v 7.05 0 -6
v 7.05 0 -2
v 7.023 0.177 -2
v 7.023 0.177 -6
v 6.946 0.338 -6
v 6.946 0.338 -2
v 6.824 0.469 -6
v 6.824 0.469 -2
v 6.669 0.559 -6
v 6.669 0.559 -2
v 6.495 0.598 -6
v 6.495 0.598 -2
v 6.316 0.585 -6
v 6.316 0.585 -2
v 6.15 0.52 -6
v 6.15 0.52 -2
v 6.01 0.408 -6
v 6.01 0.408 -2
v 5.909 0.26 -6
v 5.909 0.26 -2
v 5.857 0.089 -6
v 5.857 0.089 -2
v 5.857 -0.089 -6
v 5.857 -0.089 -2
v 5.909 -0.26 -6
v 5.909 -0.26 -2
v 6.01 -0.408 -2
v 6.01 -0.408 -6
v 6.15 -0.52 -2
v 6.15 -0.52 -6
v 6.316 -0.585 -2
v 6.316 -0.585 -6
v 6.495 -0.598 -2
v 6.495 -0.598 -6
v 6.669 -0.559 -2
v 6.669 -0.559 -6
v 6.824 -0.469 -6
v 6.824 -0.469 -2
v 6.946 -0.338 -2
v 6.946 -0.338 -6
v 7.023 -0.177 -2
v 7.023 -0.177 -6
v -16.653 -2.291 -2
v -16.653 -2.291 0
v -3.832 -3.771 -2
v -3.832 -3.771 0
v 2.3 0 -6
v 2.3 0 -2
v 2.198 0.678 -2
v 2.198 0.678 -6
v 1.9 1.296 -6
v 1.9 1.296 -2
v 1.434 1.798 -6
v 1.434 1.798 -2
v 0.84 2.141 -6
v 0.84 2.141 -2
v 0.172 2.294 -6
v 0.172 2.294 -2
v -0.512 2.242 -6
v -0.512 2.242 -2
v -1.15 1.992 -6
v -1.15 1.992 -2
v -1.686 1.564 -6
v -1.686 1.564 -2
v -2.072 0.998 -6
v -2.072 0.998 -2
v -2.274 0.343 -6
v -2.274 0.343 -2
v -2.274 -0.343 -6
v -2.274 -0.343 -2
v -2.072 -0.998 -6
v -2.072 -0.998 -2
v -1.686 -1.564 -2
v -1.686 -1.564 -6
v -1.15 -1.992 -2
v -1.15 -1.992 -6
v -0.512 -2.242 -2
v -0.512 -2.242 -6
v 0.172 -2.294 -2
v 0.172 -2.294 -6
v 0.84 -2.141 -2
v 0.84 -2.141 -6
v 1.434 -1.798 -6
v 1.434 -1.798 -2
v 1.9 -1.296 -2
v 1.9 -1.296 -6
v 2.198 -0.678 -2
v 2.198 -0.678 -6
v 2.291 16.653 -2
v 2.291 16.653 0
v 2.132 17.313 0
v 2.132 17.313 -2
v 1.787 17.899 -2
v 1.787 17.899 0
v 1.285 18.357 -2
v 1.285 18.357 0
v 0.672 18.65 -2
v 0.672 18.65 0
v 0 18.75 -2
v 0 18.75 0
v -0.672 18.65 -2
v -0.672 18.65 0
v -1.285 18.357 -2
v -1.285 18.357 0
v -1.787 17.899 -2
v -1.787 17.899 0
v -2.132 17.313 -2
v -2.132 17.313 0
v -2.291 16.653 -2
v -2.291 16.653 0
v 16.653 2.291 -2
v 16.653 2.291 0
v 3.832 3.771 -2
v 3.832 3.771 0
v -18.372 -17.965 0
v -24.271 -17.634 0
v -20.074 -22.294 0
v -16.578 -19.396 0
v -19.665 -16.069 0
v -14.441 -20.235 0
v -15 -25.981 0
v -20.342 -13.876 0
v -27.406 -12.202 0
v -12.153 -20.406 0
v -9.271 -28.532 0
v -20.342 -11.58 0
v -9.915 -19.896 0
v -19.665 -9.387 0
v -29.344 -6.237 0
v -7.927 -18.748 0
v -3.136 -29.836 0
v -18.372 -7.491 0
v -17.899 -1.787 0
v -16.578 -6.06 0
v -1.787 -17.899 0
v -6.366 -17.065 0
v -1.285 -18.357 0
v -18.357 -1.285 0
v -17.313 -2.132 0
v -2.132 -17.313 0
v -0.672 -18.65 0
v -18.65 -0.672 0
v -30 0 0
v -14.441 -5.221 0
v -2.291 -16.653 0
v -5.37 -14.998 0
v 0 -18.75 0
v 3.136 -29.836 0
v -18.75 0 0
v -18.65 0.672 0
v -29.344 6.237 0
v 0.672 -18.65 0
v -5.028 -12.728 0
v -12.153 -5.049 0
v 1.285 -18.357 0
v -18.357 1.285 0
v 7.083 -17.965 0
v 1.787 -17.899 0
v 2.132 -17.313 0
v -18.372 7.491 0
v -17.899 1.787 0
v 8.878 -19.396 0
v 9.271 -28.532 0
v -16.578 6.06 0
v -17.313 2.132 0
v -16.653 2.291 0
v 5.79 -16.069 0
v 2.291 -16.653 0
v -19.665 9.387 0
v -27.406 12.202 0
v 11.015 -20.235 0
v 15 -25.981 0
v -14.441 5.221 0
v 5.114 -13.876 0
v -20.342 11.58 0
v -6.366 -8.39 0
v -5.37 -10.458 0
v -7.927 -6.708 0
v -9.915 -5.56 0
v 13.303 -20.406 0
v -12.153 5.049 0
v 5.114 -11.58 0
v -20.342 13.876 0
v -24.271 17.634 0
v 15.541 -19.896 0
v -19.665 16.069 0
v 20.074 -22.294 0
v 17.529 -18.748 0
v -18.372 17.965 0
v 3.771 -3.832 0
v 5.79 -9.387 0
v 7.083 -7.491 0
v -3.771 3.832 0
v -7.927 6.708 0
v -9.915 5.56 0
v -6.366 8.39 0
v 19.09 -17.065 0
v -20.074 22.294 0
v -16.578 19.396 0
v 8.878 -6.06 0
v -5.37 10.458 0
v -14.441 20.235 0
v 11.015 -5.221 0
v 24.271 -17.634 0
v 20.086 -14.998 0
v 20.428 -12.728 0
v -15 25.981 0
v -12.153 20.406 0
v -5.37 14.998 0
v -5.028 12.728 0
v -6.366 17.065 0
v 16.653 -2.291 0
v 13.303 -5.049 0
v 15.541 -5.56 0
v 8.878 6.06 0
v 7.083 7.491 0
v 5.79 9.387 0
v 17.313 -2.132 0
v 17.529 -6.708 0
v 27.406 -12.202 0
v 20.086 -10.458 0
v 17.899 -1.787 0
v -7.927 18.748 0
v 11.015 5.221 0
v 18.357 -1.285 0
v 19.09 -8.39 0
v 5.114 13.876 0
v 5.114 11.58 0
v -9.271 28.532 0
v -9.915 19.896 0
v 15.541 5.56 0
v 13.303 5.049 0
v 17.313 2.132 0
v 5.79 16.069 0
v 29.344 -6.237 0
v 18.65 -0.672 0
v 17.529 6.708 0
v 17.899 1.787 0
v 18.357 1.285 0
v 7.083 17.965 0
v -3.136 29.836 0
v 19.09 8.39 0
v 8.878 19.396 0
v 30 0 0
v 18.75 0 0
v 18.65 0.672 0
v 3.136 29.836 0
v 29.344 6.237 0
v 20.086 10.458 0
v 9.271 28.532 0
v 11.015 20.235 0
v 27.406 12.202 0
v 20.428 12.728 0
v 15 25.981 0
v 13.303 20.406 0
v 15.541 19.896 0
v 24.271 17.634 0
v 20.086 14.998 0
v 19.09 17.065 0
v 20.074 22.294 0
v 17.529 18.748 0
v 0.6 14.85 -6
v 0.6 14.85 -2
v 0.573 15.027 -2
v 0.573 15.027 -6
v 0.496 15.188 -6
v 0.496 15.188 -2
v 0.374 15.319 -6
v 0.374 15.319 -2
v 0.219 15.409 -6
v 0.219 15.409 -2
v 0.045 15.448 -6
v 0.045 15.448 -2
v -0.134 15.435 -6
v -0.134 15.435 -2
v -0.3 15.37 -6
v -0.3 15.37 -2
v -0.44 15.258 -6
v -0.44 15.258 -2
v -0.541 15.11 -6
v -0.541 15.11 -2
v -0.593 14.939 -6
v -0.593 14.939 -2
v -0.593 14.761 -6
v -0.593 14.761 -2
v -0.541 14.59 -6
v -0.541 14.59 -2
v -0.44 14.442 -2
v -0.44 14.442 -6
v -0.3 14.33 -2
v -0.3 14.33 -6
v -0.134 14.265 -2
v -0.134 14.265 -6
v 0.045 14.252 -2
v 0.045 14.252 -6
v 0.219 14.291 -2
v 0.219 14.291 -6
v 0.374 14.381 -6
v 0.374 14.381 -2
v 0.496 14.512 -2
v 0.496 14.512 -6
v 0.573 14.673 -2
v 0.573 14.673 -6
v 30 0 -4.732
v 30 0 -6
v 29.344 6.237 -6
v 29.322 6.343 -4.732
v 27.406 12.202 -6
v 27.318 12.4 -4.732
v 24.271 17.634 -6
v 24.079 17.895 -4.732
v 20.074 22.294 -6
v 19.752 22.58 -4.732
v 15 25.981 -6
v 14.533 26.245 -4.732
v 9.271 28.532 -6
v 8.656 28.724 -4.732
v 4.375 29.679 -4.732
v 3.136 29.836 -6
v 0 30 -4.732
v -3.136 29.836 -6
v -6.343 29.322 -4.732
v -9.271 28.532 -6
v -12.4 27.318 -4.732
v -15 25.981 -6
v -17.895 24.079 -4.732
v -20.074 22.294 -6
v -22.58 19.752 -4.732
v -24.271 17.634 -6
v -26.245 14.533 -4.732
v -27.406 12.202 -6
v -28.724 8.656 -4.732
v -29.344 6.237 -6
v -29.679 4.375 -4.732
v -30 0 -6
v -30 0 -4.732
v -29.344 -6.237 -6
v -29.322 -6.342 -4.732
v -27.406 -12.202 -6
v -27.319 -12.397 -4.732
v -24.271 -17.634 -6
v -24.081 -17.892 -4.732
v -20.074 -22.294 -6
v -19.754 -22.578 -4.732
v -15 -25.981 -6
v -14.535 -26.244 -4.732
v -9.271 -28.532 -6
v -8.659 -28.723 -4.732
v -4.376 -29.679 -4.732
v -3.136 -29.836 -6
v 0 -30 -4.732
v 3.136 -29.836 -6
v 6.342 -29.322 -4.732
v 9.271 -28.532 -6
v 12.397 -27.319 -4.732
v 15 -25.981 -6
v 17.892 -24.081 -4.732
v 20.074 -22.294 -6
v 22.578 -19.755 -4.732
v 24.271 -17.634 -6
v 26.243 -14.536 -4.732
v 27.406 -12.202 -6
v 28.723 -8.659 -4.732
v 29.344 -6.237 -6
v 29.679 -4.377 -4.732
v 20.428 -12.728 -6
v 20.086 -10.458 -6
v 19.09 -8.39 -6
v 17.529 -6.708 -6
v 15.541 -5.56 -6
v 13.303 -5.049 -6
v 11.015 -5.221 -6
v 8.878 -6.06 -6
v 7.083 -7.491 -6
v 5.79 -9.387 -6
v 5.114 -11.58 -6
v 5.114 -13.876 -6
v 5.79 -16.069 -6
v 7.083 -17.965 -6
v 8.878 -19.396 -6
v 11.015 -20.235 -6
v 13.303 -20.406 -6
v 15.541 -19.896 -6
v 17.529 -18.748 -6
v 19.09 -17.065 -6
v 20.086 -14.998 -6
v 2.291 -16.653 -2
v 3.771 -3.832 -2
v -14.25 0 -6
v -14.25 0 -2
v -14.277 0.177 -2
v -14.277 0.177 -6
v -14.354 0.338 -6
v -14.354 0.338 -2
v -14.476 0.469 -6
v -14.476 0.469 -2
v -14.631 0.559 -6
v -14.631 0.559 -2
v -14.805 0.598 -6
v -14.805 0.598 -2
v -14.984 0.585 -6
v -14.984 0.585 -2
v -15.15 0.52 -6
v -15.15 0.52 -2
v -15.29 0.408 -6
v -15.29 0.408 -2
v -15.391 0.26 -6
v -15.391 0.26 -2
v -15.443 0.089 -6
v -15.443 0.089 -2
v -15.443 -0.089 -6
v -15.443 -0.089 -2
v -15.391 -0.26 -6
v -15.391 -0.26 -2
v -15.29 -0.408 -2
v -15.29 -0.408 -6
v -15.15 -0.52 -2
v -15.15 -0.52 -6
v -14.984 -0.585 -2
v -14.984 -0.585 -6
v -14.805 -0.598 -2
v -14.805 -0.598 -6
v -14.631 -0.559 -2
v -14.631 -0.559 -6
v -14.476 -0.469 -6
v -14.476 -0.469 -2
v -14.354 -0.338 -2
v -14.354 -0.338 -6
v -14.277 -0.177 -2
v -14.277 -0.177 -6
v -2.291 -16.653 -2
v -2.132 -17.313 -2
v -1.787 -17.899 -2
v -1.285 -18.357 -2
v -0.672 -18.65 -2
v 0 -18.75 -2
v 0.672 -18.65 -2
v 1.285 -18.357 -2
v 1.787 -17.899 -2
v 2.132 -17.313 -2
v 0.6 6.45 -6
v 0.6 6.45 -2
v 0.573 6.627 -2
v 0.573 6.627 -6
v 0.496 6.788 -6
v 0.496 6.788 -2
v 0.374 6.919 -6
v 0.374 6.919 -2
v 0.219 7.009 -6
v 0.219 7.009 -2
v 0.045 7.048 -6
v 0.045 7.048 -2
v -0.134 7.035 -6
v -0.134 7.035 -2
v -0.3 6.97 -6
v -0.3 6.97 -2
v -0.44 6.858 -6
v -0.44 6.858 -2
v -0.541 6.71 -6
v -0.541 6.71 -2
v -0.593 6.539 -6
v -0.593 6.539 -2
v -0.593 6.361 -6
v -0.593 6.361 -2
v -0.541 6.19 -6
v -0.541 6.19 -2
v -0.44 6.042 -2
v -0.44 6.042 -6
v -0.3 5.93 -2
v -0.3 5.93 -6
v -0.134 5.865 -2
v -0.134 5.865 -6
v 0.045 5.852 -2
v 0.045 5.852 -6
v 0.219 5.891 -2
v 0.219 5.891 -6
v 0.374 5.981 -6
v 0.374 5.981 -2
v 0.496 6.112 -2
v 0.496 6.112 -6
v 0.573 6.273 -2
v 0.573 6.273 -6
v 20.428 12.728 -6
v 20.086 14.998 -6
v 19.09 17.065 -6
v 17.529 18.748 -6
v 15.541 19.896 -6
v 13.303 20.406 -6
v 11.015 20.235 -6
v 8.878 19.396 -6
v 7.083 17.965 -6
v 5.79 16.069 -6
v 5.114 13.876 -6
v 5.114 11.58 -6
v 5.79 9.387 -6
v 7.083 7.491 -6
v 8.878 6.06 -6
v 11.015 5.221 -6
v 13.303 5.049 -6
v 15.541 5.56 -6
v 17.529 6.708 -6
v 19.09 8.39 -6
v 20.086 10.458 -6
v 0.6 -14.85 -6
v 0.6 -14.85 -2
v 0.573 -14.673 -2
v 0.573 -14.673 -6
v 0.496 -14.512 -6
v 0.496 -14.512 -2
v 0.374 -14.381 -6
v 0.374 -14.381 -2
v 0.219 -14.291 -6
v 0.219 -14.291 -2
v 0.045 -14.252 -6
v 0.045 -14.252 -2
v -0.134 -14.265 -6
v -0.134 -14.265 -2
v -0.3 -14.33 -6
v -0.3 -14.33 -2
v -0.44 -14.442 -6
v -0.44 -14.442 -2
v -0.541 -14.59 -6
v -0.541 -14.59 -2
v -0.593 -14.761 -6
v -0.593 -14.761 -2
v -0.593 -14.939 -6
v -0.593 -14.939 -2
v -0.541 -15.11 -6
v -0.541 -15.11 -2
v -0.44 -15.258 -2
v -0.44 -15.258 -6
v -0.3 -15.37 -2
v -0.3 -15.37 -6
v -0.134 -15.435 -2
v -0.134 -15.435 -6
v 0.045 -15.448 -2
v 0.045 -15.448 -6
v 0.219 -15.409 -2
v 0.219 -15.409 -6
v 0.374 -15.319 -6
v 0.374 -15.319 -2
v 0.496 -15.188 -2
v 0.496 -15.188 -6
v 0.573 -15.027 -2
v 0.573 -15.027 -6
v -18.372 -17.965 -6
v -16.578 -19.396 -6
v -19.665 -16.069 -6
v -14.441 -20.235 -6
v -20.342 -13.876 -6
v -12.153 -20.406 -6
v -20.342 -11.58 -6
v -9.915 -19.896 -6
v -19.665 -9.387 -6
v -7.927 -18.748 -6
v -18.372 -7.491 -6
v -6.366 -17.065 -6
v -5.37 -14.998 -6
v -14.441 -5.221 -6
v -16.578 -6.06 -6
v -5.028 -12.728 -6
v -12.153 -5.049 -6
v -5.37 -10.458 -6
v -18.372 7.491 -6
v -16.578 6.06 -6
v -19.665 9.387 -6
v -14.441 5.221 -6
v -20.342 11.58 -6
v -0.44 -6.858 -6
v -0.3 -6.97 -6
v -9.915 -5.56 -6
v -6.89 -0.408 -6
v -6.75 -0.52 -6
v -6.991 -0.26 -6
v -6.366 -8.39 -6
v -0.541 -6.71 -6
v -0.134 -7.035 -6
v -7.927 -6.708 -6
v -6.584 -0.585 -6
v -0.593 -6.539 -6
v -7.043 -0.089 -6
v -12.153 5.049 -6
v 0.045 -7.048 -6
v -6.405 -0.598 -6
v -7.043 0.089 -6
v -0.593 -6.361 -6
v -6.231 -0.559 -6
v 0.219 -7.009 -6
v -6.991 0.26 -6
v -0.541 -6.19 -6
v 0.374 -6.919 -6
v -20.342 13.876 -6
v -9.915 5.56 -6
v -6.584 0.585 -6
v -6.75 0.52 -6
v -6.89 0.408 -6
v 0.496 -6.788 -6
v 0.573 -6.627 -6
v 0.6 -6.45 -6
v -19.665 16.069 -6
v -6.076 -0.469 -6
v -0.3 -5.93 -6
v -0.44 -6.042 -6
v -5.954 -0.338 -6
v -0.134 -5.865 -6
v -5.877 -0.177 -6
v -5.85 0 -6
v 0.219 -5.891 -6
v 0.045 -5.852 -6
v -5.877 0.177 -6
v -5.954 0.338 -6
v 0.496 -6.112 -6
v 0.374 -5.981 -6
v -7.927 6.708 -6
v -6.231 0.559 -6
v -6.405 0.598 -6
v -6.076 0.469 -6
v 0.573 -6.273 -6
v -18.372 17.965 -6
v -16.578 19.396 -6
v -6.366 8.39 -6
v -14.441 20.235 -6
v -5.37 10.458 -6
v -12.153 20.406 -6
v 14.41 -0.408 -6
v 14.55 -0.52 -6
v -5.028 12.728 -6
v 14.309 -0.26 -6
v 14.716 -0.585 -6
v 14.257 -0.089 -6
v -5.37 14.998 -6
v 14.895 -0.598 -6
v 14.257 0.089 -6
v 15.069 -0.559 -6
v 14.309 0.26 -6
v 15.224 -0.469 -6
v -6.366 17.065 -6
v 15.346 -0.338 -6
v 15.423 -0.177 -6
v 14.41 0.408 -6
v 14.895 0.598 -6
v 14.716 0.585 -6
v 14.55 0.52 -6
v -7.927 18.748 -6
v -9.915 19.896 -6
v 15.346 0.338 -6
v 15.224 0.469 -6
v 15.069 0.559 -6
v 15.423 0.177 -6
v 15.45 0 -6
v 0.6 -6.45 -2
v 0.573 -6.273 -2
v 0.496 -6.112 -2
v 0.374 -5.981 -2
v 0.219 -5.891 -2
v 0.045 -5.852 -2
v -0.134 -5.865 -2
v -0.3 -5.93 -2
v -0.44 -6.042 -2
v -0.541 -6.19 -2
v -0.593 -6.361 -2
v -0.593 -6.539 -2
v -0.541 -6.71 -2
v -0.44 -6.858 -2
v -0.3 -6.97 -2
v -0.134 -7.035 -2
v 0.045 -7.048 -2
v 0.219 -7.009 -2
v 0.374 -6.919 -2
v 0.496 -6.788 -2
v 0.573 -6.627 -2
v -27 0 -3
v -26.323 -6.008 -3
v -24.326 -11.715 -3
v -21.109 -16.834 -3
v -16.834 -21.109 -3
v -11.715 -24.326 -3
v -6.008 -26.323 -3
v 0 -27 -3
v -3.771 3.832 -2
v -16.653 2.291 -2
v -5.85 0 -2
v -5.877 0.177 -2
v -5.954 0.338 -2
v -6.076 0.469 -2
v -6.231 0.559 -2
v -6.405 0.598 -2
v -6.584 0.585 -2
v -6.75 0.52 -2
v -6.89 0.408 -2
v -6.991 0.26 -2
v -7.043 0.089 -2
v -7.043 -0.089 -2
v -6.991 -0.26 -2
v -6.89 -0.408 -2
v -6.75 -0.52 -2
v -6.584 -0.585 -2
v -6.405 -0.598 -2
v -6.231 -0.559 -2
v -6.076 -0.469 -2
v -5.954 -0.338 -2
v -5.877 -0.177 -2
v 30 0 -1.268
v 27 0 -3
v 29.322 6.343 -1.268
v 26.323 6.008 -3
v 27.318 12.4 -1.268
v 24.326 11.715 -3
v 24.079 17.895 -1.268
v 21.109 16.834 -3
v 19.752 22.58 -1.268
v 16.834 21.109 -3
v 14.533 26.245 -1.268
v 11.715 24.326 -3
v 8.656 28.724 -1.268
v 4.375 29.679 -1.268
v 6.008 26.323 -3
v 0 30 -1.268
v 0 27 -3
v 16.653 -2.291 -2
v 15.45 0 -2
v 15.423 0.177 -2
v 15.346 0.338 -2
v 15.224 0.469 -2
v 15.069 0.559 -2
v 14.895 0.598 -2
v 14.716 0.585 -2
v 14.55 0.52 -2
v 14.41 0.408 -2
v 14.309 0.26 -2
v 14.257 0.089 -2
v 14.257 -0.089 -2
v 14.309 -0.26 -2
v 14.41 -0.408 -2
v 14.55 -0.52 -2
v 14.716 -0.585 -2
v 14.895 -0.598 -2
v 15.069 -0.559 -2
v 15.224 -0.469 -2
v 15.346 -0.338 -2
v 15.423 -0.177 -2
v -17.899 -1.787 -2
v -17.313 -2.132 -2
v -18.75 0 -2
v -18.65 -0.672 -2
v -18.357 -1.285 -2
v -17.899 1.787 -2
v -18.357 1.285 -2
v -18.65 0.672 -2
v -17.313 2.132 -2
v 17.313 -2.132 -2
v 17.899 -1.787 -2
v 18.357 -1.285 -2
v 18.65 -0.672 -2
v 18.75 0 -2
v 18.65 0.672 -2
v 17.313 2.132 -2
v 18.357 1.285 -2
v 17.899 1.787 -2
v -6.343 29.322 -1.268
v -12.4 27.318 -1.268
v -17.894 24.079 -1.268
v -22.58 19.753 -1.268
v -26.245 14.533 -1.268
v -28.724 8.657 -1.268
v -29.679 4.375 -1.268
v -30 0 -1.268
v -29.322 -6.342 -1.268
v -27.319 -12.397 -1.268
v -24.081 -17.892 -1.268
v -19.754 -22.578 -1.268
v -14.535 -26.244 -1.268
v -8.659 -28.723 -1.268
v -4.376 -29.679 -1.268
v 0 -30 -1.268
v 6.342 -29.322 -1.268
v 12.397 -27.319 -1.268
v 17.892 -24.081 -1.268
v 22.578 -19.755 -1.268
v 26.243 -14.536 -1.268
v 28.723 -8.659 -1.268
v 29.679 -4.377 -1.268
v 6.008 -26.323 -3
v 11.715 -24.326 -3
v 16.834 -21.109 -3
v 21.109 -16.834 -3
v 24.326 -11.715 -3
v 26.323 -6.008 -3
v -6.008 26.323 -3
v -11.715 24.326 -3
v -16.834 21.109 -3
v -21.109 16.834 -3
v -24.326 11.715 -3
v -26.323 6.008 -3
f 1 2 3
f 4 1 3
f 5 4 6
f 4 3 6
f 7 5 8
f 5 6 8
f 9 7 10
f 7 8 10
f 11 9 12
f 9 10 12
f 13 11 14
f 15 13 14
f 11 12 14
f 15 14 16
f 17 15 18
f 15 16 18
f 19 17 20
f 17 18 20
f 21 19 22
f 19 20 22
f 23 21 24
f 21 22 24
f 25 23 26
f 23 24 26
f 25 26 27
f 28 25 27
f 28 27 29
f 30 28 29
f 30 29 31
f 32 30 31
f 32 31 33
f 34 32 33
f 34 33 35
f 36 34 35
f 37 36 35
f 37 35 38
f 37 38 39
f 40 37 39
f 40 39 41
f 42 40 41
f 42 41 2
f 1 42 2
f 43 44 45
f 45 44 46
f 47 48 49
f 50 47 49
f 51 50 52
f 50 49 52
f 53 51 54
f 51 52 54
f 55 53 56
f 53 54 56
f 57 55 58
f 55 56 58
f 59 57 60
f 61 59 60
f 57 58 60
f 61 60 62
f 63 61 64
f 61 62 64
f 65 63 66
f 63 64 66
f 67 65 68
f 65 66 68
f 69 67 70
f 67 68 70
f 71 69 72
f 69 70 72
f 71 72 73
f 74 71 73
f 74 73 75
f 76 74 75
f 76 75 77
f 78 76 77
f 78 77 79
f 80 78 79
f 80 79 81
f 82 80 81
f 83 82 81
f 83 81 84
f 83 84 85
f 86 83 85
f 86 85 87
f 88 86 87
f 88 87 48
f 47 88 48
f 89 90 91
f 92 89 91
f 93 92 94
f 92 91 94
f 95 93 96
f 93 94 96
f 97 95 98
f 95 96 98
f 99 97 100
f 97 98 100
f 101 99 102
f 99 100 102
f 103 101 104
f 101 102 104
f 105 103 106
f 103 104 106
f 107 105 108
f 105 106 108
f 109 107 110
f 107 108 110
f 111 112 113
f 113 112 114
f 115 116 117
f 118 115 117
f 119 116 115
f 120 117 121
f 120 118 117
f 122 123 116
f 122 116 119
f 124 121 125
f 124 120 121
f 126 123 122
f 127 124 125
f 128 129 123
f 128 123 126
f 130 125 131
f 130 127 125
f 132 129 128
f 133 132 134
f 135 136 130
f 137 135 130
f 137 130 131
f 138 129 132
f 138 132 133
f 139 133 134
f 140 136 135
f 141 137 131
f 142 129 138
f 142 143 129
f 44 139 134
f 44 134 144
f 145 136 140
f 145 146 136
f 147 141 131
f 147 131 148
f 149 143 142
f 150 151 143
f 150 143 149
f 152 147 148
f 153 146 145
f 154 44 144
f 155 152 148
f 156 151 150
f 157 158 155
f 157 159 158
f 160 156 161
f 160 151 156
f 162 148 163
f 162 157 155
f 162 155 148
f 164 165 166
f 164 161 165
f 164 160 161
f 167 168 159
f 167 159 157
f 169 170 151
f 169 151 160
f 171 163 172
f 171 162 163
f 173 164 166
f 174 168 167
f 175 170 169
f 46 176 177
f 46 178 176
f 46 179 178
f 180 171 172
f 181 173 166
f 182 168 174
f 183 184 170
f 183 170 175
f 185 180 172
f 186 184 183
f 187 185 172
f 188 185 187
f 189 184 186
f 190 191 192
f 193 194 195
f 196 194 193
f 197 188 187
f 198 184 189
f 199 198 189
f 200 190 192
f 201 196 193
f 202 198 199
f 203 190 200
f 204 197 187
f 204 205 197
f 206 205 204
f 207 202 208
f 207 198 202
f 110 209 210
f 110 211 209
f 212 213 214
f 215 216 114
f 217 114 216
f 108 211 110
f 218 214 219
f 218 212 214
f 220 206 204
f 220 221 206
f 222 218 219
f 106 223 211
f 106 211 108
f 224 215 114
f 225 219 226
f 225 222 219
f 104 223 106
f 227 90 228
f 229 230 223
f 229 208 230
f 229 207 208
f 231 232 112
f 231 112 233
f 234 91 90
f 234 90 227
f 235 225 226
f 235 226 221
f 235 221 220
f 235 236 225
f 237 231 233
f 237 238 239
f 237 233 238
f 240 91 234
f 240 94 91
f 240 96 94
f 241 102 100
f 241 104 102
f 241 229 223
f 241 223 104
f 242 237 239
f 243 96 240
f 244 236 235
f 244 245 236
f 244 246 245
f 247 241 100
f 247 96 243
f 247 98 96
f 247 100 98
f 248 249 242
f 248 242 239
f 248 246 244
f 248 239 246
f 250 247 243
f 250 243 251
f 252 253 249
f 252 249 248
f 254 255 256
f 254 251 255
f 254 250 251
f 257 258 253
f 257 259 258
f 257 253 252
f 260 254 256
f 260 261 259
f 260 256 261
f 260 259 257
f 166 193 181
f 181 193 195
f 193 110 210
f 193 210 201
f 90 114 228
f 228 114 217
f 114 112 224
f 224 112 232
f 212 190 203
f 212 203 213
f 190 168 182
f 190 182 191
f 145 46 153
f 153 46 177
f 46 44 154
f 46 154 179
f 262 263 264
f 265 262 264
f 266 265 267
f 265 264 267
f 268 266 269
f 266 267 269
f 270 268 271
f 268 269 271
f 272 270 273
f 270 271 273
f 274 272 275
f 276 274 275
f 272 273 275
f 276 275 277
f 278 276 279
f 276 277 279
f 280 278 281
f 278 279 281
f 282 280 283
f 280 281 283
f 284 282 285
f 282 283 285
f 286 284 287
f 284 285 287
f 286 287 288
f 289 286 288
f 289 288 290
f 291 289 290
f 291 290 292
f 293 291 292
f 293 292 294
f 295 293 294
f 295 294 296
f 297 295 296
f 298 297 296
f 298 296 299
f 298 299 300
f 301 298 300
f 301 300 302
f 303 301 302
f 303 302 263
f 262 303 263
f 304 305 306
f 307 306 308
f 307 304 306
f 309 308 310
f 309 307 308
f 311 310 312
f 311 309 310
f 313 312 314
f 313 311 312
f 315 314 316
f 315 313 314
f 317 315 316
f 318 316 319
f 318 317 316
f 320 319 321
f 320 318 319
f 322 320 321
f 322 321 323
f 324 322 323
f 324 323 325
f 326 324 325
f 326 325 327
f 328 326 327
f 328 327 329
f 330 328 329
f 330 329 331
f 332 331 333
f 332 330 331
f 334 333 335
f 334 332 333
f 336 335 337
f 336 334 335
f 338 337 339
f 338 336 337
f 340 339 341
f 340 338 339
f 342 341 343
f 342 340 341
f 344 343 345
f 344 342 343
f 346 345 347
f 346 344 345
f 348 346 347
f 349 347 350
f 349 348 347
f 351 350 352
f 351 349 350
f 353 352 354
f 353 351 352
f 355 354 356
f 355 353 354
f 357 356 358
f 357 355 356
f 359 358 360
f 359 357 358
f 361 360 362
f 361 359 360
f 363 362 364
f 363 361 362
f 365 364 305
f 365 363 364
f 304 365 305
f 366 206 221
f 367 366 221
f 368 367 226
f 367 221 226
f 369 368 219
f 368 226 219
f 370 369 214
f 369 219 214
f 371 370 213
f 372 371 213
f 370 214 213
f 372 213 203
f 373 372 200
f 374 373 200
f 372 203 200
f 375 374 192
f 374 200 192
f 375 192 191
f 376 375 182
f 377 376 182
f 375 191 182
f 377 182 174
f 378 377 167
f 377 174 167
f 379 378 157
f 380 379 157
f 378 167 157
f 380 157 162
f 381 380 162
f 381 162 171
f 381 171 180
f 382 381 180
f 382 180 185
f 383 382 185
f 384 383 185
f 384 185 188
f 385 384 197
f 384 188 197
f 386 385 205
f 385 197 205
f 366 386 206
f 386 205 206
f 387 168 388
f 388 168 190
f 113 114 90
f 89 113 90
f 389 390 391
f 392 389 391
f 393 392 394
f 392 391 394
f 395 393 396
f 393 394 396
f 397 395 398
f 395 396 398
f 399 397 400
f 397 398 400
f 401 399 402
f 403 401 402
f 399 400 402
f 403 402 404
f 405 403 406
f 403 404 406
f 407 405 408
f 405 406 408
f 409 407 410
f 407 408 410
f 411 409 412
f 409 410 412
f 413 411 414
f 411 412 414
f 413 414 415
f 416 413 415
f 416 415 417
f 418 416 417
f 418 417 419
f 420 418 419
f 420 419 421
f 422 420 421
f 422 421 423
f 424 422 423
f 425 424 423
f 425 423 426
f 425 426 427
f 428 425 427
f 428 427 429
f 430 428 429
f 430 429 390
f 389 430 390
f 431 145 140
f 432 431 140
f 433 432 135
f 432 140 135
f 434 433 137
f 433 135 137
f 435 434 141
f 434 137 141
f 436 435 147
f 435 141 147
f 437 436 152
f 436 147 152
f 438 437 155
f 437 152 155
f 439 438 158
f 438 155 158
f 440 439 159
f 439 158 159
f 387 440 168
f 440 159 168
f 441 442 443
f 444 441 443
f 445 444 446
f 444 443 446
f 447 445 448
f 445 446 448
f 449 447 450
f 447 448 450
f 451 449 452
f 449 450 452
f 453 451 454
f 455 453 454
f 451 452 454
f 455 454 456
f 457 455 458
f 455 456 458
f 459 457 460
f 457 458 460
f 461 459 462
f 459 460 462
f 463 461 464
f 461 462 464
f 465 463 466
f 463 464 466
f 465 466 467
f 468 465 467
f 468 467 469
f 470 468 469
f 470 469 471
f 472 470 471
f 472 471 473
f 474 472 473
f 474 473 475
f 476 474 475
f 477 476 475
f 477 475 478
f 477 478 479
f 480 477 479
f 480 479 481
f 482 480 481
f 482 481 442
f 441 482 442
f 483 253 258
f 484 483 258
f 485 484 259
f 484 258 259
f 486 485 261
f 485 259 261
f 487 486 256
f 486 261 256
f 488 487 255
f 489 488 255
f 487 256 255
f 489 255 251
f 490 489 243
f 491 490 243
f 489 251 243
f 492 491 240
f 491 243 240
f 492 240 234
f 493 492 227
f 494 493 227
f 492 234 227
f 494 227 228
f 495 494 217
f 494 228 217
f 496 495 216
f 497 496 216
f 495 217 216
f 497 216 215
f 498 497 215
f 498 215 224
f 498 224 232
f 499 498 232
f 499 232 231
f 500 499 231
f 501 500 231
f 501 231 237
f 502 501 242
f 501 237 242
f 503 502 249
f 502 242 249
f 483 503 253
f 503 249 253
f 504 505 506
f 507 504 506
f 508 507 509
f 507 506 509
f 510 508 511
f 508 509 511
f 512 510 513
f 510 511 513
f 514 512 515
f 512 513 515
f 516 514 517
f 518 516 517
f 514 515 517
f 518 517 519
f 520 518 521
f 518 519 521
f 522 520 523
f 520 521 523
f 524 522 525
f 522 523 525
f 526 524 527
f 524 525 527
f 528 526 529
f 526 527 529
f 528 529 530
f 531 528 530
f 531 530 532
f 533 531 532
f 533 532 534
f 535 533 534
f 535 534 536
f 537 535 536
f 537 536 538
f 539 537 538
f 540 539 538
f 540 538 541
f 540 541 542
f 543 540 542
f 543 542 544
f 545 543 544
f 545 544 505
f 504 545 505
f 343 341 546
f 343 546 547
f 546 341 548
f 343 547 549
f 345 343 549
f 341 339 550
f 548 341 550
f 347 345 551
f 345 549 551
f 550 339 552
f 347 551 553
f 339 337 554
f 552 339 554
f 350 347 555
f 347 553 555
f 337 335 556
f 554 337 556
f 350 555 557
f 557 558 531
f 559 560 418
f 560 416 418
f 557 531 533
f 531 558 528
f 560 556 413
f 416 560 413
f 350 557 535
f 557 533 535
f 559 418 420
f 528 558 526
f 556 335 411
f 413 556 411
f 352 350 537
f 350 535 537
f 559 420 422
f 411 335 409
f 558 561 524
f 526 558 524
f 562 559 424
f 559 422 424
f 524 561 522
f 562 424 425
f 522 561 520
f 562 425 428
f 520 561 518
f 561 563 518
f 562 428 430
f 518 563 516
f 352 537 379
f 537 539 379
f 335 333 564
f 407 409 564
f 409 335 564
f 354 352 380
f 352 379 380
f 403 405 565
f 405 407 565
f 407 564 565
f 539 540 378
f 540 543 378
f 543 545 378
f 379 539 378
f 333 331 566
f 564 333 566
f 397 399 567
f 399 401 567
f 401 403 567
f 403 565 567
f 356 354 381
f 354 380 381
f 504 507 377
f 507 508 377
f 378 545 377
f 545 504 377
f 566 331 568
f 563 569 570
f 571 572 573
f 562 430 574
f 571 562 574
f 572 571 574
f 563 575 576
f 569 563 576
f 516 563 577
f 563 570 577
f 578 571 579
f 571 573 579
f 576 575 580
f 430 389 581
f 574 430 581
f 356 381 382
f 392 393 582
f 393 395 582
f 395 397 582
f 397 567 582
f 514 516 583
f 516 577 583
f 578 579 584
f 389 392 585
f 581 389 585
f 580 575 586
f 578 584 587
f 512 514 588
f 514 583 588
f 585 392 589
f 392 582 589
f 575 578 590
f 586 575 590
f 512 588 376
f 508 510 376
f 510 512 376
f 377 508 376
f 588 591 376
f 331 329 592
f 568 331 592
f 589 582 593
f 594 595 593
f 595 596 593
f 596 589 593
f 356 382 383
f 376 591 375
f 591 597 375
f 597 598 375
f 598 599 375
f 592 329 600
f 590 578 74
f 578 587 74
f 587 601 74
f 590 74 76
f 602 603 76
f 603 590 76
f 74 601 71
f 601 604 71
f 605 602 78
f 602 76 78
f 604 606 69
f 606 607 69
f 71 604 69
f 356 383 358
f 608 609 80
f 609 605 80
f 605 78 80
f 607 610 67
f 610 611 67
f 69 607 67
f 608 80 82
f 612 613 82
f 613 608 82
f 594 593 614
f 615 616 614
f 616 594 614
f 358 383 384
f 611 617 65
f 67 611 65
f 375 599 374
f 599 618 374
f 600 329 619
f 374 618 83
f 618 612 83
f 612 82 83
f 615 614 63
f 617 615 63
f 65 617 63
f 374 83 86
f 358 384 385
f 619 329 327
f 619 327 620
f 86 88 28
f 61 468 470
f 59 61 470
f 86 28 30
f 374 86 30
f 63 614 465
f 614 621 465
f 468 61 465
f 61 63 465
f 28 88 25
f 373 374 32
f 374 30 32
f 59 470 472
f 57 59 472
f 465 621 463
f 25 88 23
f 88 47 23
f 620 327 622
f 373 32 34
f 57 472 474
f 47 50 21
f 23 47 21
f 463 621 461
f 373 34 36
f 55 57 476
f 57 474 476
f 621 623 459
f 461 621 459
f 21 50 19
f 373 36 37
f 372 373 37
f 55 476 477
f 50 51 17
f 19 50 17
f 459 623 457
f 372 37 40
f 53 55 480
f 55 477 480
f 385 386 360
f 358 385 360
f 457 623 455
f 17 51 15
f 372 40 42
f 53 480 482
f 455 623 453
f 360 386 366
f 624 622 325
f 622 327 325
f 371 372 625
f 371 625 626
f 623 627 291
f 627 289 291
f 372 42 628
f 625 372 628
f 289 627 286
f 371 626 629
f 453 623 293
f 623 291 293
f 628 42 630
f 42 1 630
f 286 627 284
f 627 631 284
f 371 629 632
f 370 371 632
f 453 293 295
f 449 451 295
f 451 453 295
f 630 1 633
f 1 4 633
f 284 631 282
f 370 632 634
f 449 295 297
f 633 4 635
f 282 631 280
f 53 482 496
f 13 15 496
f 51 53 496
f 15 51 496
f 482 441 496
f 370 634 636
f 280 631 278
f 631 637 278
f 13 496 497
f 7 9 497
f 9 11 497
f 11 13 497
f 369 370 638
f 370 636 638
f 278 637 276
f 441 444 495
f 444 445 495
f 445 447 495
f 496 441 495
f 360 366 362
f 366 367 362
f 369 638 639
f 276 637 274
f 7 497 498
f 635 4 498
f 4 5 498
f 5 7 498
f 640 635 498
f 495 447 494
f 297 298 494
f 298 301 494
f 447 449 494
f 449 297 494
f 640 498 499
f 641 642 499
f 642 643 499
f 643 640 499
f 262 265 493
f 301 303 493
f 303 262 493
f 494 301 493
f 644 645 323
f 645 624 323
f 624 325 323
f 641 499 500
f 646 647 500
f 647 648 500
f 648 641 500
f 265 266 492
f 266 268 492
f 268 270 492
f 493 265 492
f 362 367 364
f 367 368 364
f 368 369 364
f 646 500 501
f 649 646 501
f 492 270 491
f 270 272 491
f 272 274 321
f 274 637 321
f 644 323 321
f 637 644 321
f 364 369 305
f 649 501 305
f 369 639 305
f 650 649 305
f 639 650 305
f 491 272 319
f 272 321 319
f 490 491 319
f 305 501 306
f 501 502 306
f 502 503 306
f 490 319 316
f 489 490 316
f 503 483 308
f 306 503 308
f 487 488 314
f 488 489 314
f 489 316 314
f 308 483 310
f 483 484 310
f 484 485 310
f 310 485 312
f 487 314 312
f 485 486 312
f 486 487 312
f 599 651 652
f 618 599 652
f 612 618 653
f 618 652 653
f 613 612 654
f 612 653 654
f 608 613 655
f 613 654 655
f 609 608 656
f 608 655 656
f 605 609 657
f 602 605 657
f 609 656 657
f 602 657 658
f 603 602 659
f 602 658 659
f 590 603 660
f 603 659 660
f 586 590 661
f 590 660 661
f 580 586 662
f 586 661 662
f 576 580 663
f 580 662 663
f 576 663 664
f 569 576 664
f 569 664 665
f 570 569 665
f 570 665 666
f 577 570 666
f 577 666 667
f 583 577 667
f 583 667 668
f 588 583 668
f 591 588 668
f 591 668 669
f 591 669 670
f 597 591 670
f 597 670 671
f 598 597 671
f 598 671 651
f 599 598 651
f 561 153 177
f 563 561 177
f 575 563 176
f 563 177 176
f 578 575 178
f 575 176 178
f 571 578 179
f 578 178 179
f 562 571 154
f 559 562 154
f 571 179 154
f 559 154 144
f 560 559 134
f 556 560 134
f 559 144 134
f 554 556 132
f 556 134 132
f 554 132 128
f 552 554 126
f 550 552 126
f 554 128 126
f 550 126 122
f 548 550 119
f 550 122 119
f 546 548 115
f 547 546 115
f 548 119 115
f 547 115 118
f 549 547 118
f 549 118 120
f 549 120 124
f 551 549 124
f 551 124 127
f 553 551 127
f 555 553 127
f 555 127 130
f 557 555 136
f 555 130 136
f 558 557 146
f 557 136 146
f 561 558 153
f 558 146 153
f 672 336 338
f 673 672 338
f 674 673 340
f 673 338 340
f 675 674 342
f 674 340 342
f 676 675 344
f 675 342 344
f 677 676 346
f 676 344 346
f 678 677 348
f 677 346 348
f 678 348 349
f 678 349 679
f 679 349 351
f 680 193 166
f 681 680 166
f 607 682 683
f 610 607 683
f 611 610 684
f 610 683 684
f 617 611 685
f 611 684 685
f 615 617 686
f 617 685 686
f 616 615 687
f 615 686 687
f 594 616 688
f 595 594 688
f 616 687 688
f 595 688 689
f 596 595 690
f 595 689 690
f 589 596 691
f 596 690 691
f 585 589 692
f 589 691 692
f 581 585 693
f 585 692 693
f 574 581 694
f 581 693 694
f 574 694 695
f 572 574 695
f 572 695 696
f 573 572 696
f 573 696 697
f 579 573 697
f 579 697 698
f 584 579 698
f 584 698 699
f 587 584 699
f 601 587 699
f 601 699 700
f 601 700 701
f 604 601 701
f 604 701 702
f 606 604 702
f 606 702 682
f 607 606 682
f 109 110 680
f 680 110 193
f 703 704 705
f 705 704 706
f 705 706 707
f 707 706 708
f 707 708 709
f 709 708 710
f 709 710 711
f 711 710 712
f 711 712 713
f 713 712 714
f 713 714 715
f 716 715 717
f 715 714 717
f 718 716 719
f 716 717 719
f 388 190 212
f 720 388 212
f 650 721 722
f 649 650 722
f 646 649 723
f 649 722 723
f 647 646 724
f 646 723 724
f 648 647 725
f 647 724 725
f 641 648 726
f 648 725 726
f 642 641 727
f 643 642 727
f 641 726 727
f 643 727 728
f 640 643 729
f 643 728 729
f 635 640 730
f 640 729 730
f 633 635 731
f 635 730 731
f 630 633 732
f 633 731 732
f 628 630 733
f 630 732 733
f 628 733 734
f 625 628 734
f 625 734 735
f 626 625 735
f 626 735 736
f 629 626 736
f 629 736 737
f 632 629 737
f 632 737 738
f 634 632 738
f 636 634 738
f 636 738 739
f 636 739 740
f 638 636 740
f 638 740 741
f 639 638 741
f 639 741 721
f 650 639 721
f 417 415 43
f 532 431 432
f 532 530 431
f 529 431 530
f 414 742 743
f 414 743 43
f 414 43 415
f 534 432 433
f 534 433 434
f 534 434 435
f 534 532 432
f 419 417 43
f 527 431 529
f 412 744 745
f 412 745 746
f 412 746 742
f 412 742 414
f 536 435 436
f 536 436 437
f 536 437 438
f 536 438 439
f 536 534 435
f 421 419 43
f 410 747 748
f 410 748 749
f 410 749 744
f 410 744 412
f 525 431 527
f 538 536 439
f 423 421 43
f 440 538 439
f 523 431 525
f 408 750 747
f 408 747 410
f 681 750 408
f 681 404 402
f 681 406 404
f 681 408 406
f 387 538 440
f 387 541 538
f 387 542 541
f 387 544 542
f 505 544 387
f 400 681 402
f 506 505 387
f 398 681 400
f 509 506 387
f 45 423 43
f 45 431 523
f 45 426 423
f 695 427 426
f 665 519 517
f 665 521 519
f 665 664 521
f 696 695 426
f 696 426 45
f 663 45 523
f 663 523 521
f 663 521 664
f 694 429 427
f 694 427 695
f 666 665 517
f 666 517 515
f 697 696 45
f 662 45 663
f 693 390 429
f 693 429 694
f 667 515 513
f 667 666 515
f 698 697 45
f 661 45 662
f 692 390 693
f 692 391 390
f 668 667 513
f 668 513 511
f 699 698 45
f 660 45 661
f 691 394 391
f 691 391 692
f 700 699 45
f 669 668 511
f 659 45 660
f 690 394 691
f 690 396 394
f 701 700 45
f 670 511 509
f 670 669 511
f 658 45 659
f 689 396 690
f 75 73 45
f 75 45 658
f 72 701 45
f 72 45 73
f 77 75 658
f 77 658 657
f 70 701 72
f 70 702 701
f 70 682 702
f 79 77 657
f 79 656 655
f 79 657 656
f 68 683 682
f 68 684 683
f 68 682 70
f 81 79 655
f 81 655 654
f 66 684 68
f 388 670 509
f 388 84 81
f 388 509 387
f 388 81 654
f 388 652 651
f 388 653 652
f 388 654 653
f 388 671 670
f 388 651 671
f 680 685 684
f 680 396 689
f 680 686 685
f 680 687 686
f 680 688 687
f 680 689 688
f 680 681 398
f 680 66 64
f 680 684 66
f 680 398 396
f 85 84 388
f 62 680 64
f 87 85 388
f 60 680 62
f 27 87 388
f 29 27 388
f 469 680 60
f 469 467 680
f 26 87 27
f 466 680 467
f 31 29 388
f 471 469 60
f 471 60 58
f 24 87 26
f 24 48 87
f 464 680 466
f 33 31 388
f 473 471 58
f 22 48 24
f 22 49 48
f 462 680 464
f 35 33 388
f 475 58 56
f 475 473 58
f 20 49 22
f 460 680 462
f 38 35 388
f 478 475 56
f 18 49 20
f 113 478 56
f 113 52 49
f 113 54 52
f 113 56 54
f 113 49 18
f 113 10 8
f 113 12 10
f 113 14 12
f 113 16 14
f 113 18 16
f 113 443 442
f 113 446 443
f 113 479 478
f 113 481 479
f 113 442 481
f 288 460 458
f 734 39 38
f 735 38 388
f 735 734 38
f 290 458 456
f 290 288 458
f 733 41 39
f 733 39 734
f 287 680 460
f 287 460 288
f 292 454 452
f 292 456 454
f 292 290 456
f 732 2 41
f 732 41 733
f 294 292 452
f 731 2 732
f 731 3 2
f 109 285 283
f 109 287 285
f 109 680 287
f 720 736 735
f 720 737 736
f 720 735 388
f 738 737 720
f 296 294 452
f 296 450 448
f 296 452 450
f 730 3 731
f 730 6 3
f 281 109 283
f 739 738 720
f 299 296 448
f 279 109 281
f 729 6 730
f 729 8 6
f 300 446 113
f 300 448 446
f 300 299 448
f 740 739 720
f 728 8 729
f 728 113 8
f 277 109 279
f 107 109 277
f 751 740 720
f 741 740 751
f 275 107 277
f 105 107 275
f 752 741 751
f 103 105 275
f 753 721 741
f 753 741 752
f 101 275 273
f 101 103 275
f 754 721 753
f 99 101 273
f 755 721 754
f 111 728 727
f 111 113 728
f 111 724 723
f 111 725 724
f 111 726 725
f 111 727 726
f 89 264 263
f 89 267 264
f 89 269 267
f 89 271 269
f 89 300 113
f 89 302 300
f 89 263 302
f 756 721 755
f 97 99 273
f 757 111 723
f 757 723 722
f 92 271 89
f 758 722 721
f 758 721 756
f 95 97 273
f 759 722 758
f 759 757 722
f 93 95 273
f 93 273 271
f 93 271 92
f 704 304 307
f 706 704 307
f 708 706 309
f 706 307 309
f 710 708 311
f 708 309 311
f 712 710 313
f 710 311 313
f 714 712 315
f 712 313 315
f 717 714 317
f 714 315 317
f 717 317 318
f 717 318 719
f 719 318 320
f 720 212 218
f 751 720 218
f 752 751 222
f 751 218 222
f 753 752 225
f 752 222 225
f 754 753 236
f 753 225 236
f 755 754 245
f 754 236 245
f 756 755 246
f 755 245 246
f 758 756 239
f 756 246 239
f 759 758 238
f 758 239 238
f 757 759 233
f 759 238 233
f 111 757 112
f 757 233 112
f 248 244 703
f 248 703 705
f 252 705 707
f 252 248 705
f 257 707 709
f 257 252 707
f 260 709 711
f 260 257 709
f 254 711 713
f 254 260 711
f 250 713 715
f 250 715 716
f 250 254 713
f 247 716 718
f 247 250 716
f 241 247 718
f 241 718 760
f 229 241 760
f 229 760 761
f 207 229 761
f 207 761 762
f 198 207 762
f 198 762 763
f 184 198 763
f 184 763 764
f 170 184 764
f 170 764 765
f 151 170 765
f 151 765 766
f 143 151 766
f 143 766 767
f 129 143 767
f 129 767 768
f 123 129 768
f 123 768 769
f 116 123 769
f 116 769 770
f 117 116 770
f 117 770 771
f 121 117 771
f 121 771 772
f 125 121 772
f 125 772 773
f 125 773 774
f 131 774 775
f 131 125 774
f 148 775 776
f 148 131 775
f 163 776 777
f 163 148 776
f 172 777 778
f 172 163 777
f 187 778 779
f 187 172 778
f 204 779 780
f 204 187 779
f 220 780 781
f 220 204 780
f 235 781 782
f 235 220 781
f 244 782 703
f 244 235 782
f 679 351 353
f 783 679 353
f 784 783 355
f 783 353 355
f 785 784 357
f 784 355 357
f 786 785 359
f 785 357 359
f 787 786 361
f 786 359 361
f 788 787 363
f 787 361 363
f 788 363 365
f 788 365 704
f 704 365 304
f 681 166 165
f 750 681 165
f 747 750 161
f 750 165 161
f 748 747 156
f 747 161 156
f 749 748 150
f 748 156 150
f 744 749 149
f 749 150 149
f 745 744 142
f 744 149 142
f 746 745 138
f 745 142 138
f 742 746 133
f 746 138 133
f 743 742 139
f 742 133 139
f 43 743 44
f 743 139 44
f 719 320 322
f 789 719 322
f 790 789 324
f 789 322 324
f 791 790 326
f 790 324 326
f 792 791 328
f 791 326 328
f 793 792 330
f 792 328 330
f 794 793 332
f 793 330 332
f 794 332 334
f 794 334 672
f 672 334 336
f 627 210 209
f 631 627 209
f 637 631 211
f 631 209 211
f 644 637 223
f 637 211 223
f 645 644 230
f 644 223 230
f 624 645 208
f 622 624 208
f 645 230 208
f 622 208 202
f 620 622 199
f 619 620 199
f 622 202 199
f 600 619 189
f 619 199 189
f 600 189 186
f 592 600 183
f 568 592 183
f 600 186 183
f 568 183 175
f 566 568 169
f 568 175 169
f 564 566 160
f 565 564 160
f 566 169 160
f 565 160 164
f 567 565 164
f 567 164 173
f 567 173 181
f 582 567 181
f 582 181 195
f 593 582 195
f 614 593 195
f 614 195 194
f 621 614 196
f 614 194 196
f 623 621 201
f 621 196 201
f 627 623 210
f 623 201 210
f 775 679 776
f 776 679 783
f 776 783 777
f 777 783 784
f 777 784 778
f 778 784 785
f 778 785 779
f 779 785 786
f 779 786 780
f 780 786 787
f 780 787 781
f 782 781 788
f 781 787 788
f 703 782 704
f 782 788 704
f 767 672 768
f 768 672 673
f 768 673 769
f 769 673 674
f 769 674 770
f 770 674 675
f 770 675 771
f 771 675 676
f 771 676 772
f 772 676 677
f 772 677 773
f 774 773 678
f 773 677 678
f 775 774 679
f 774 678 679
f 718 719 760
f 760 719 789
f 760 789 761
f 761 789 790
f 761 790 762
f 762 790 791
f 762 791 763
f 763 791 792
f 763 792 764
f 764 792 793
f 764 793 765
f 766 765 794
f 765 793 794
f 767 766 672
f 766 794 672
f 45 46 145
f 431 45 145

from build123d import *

# Parameters (mm, degrees)
SKETCH1_R           = 30
SKETCH1_R_2         = 7.7
SKETCH1_R_3         = 2.3
SKETCH1_R_4         = 0.6
BOSS_EXTRUDE1_DEPTH = 6
CUT_EXTRUDE1_DEPTH  = 2


with BuildPart() as part:
    # Sketch1 → Boss-Extrude1 (new body)
    with BuildSketch(Plane.XY):
        Circle(SKETCH1_R)
        with Locations((-12.727922061, 12.727922061)):
            Circle(SKETCH1_R_2, mode=Mode.SUBTRACT)
        with Locations((12.727922061, 12.727922061)):
            Circle(SKETCH1_R_2, mode=Mode.SUBTRACT)
        with Locations((12.727922061, -12.727922061)):
            Circle(SKETCH1_R_2, mode=Mode.SUBTRACT)
        with Locations((-12.727922061, -12.727922061)):
            Circle(SKETCH1_R_2, mode=Mode.SUBTRACT)
        Circle(SKETCH1_R_3, mode=Mode.SUBTRACT)
        with Locations((-14.85, 0)):
            Circle(SKETCH1_R_4, mode=Mode.SUBTRACT)
        with Locations((6.45, 0)):
            Circle(SKETCH1_R_4, mode=Mode.SUBTRACT)
        with Locations((0, -6.45)):
            Circle(SKETCH1_R_4, mode=Mode.SUBTRACT)
        with Locations((-6.45, 0)):
            Circle(SKETCH1_R_4, mode=Mode.SUBTRACT)
        with Locations((0, 6.45)):
            Circle(SKETCH1_R_4, mode=Mode.SUBTRACT)
        with Locations((0, 14.85)):
            Circle(SKETCH1_R_4, mode=Mode.SUBTRACT)
        with Locations((14.85, 0)):
            Circle(SKETCH1_R_4, mode=Mode.SUBTRACT)
        with Locations((0, -14.85)):
            Circle(SKETCH1_R_4, mode=Mode.SUBTRACT)
    extrude(amount=-BOSS_EXTRUDE1_DEPTH)

    # Cut-Sweep1: sweep along a curve in space
    with BuildLine() as cut_sweep1_path:
        ThreePointArc((30, 0, -6), (21.213203436, 21.213203436, -6), (0, 30, -6))
        ThreePointArc((0, 30, -6), (-21.213203436, 21.213203436, -6), (-30, 0, -6))
        ThreePointArc((-30, 0, -6), (-21.213203436, -21.213203436, -6), (0, -30, -6))
        ThreePointArc((0, -30, -6), (21.213203436, -21.213203436, -6), (30, 0, -6))
    # Sketch2 → Cut-Sweep1 (sweep, cut)
    with BuildSketch(Plane(origin=(0, 0, 0), x_dir=(1, 0, 0), z_dir=(0, 1, 0))):
        Polygon((-31.156921938, 0.6), (-27, 3), (-31.156921938, 5.4), align=None)
    sweep(path=cut_sweep1_path.line, mode=Mode.SUBTRACT)

    # Sketch4 → Cut-Extrude1 (cut)
    with BuildSketch(Plane.XY):
        with BuildLine():
            Line((-3.770723751, 3.831893278), (-16.652735562, 2.291047422))
            ThreePointArc((-16.652735562, 2.291047422), (-18.75, 0), (-16.652735562, -2.291047422))
            Line((-16.652735562, -2.291047422), (-3.831893278, -3.770723751))
            Line((-3.831893278, -3.770723751), (-2.291047422, -16.652735562))
            ThreePointArc((-2.291047422, -16.652735562), (0, -18.75), (2.291047422, -16.652735562))
            Line((2.291047422, -16.652735562), (3.770723751, -3.831893278))
            Line((3.770723751, -3.831893278), (16.652735562, -2.291047422))
            ThreePointArc((16.652735562, -2.291047422), (18.75, 0), (16.652735562, 2.291047422))
            Line((16.652735562, 2.291047422), (3.831893278, 3.770723751))
            Line((3.831893278, 3.770723751), (2.291047422, 16.652735562))
            ThreePointArc((2.291047422, 16.652735562), (0, 18.75), (-2.291047422, 16.652735562))
            Line((-2.291047422, 16.652735562), (-3.770723751, 3.831893278))
        make_face()
    extrude(amount=-CUT_EXTRUDE1_DEPTH, mode=Mode.SUBTRACT)


solid = part.part
